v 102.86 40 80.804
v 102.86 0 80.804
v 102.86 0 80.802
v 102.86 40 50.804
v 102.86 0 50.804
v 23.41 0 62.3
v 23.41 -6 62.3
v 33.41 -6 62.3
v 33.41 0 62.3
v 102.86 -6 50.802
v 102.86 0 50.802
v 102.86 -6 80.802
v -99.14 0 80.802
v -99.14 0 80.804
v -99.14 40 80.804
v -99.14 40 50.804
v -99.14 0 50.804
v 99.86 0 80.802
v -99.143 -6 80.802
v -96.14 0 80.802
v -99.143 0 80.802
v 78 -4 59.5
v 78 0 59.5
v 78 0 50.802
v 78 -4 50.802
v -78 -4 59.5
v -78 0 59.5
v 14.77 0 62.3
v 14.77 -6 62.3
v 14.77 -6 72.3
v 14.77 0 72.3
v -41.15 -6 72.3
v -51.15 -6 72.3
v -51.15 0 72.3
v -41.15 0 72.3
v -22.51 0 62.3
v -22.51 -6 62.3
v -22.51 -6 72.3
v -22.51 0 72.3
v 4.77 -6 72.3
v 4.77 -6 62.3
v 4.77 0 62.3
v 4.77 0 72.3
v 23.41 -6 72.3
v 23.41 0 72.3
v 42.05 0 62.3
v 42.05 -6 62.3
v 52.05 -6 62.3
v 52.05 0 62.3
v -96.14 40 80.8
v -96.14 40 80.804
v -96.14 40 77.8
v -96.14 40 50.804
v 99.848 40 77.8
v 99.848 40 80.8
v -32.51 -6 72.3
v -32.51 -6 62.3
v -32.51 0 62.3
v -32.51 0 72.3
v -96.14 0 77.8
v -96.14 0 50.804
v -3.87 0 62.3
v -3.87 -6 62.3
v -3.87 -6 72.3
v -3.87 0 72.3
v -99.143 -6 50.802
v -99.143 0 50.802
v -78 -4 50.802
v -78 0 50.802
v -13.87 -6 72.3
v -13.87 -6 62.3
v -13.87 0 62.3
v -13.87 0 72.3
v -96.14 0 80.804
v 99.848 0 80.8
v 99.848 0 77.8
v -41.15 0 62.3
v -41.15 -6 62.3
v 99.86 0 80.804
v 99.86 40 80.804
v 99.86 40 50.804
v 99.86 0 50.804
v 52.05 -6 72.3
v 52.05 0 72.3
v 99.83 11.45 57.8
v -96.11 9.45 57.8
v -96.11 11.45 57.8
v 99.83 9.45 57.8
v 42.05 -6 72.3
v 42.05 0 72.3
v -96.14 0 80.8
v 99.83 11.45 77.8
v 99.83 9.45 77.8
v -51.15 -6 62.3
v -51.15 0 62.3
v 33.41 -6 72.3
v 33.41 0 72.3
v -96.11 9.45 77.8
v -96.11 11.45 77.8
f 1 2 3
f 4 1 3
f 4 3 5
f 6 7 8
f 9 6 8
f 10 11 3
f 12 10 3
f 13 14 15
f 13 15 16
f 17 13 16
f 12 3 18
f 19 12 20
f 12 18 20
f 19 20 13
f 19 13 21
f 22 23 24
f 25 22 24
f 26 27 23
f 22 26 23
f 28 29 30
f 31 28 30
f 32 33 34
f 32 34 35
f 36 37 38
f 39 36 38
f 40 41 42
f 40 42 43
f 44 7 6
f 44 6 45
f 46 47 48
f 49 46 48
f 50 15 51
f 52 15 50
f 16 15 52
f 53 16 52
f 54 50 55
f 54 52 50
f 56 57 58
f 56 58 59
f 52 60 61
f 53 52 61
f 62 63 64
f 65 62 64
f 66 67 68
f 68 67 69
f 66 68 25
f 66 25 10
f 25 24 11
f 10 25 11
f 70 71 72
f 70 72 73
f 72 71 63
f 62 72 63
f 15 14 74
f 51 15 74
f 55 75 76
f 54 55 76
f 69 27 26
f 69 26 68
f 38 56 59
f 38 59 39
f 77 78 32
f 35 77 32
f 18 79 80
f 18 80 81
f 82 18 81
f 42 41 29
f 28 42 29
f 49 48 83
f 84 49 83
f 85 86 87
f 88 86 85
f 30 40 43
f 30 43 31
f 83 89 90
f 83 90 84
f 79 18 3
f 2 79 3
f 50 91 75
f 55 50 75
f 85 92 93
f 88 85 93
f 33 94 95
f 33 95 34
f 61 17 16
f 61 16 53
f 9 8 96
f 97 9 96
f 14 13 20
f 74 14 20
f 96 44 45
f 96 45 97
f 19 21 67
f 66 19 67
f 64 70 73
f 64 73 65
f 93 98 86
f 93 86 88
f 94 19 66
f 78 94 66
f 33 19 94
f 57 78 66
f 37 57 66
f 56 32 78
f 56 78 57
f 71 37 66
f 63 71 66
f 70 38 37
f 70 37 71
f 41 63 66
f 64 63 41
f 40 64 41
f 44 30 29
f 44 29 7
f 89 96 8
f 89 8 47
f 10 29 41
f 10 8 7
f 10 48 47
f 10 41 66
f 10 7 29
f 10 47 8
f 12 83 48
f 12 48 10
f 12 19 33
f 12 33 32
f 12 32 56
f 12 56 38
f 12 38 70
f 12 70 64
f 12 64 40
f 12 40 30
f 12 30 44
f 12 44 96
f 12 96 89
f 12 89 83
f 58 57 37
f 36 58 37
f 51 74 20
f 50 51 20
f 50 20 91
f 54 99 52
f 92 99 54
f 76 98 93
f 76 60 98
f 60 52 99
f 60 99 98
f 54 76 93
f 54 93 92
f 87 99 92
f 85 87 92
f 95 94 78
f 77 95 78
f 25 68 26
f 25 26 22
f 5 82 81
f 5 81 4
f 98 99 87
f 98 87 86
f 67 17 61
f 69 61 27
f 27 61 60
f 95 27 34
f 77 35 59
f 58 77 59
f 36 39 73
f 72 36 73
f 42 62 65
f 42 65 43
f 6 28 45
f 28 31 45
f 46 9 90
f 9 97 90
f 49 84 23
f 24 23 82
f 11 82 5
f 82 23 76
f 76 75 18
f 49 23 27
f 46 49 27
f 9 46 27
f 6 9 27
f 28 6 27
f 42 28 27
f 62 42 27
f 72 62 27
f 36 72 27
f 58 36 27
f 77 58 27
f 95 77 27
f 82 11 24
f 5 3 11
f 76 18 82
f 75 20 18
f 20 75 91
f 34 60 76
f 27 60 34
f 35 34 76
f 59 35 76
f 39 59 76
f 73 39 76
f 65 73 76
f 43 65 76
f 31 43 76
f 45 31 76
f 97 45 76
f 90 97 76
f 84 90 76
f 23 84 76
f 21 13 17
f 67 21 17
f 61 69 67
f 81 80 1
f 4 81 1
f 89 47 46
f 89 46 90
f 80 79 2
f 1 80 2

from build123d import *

# Parameters (mm, degrees)
PAD_DEPTH           = 6
SKETCH001_W         = 156
SKETCH001_H         = 8.81
POCKET_DEPTH        = 4
SKETCH015_W         = 10
SKETCH015_H         = 10
POCKET001_DEPTH     = 6.001
SKETCH016_W         = 3
SKETCH016_H         = 30
PAD001_DEPTH        = 40
LINEARPATTERN_COUNT = 2
LINEARPATTERN_PITCH = 199
SKETCH017_W         = 196
SKETCH017_H         = 3
PAD002_DEPTH        = 40
SKETCH018_W         = 195.94
SKETCH018_H         = 2
PAD003_DEPTH        = 20


with BuildPart() as part:
    # Sketch → Pad (new body)
    with BuildSketch(Plane.XZ):
        Polygon((-69.143125, 50.802246), (72.856875, 50.802246), (102.86, 50.802246), (102.86, 80.802246), (-99.143366, 80.802246), (-99.143366, 50.802246), align=None)
    extrude(amount=PAD_DEPTH)

    # Sketch001 → Pocket (cut)
    with BuildSketch(Plane(origin=(0, 0, 0), x_dir=(1, 0, 0), z_dir=(0, 1, 0))):
        with Locations((0, -55.095)):
            Rectangle(SKETCH001_W, SKETCH001_H)
    extrude(amount=-POCKET_DEPTH, mode=Mode.SUBTRACT)

    # Sketch015 → Pocket001 (cut, through all)
    with BuildSketch(Plane.XZ.offset(6)):
        with Locations((-46.15, 67.3)):
            Rectangle(SKETCH015_W, SKETCH015_H)
        with Locations((-27.51, 67.3)):
            Rectangle(SKETCH015_W, SKETCH015_H)
        with Locations((-8.87, 67.3)):
            Rectangle(SKETCH015_W, SKETCH015_H)
        with Locations((9.77, 67.3)):
            Rectangle(SKETCH015_W, SKETCH015_H)
        with Locations((28.41, 67.3)):
            Rectangle(SKETCH015_W, SKETCH015_H)
        with Locations((47.05, 67.3)):
            Rectangle(SKETCH015_W, SKETCH015_H)
    extrude(amount=-POCKET001_DEPTH, mode=Mode.SUBTRACT)

    # Sketch016 (on Face4 of Pocket001) → Pad001 (join)
    with BuildSketch(Plane(origin=(0, 0, 0), x_dir=(1, 0, 0), z_dir=(0, 1, 0))):
        with Locations((101.359965, -65.804146)):
            Rectangle(SKETCH016_W, SKETCH016_H)
    pad001 = extrude(amount=PAD001_DEPTH)

    # LinearPattern: Pad001 ×2
    with Locations(*[(-i * LINEARPATTERN_PITCH, 0, 0) for i in range(1, LINEARPATTERN_COUNT)]):
        add(pad001)

    # Sketch017 (on Face4 of LinearPattern) → Pad002 (join)
    with BuildSketch(Plane(origin=(0, 0, 0), x_dir=(1, 0, 0), z_dir=(0, 1, 0))):
        with Locations((1.848167, -79.3)):
            Rectangle(SKETCH017_W, SKETCH017_H)
    extrude(amount=PAD002_DEPTH)

    # Sketch018 (on Face21 of Pad002) → Pad003 (join)
    with BuildSketch(Plane(origin=(0, 0, 77.8), x_dir=(1, 0, 0), z_dir=(0, 0, -1))):
        with Locations((1.86, -10.45)):
            Rectangle(SKETCH018_W, SKETCH018_H)
    extrude(amount=PAD003_DEPTH)


solid = part.part
